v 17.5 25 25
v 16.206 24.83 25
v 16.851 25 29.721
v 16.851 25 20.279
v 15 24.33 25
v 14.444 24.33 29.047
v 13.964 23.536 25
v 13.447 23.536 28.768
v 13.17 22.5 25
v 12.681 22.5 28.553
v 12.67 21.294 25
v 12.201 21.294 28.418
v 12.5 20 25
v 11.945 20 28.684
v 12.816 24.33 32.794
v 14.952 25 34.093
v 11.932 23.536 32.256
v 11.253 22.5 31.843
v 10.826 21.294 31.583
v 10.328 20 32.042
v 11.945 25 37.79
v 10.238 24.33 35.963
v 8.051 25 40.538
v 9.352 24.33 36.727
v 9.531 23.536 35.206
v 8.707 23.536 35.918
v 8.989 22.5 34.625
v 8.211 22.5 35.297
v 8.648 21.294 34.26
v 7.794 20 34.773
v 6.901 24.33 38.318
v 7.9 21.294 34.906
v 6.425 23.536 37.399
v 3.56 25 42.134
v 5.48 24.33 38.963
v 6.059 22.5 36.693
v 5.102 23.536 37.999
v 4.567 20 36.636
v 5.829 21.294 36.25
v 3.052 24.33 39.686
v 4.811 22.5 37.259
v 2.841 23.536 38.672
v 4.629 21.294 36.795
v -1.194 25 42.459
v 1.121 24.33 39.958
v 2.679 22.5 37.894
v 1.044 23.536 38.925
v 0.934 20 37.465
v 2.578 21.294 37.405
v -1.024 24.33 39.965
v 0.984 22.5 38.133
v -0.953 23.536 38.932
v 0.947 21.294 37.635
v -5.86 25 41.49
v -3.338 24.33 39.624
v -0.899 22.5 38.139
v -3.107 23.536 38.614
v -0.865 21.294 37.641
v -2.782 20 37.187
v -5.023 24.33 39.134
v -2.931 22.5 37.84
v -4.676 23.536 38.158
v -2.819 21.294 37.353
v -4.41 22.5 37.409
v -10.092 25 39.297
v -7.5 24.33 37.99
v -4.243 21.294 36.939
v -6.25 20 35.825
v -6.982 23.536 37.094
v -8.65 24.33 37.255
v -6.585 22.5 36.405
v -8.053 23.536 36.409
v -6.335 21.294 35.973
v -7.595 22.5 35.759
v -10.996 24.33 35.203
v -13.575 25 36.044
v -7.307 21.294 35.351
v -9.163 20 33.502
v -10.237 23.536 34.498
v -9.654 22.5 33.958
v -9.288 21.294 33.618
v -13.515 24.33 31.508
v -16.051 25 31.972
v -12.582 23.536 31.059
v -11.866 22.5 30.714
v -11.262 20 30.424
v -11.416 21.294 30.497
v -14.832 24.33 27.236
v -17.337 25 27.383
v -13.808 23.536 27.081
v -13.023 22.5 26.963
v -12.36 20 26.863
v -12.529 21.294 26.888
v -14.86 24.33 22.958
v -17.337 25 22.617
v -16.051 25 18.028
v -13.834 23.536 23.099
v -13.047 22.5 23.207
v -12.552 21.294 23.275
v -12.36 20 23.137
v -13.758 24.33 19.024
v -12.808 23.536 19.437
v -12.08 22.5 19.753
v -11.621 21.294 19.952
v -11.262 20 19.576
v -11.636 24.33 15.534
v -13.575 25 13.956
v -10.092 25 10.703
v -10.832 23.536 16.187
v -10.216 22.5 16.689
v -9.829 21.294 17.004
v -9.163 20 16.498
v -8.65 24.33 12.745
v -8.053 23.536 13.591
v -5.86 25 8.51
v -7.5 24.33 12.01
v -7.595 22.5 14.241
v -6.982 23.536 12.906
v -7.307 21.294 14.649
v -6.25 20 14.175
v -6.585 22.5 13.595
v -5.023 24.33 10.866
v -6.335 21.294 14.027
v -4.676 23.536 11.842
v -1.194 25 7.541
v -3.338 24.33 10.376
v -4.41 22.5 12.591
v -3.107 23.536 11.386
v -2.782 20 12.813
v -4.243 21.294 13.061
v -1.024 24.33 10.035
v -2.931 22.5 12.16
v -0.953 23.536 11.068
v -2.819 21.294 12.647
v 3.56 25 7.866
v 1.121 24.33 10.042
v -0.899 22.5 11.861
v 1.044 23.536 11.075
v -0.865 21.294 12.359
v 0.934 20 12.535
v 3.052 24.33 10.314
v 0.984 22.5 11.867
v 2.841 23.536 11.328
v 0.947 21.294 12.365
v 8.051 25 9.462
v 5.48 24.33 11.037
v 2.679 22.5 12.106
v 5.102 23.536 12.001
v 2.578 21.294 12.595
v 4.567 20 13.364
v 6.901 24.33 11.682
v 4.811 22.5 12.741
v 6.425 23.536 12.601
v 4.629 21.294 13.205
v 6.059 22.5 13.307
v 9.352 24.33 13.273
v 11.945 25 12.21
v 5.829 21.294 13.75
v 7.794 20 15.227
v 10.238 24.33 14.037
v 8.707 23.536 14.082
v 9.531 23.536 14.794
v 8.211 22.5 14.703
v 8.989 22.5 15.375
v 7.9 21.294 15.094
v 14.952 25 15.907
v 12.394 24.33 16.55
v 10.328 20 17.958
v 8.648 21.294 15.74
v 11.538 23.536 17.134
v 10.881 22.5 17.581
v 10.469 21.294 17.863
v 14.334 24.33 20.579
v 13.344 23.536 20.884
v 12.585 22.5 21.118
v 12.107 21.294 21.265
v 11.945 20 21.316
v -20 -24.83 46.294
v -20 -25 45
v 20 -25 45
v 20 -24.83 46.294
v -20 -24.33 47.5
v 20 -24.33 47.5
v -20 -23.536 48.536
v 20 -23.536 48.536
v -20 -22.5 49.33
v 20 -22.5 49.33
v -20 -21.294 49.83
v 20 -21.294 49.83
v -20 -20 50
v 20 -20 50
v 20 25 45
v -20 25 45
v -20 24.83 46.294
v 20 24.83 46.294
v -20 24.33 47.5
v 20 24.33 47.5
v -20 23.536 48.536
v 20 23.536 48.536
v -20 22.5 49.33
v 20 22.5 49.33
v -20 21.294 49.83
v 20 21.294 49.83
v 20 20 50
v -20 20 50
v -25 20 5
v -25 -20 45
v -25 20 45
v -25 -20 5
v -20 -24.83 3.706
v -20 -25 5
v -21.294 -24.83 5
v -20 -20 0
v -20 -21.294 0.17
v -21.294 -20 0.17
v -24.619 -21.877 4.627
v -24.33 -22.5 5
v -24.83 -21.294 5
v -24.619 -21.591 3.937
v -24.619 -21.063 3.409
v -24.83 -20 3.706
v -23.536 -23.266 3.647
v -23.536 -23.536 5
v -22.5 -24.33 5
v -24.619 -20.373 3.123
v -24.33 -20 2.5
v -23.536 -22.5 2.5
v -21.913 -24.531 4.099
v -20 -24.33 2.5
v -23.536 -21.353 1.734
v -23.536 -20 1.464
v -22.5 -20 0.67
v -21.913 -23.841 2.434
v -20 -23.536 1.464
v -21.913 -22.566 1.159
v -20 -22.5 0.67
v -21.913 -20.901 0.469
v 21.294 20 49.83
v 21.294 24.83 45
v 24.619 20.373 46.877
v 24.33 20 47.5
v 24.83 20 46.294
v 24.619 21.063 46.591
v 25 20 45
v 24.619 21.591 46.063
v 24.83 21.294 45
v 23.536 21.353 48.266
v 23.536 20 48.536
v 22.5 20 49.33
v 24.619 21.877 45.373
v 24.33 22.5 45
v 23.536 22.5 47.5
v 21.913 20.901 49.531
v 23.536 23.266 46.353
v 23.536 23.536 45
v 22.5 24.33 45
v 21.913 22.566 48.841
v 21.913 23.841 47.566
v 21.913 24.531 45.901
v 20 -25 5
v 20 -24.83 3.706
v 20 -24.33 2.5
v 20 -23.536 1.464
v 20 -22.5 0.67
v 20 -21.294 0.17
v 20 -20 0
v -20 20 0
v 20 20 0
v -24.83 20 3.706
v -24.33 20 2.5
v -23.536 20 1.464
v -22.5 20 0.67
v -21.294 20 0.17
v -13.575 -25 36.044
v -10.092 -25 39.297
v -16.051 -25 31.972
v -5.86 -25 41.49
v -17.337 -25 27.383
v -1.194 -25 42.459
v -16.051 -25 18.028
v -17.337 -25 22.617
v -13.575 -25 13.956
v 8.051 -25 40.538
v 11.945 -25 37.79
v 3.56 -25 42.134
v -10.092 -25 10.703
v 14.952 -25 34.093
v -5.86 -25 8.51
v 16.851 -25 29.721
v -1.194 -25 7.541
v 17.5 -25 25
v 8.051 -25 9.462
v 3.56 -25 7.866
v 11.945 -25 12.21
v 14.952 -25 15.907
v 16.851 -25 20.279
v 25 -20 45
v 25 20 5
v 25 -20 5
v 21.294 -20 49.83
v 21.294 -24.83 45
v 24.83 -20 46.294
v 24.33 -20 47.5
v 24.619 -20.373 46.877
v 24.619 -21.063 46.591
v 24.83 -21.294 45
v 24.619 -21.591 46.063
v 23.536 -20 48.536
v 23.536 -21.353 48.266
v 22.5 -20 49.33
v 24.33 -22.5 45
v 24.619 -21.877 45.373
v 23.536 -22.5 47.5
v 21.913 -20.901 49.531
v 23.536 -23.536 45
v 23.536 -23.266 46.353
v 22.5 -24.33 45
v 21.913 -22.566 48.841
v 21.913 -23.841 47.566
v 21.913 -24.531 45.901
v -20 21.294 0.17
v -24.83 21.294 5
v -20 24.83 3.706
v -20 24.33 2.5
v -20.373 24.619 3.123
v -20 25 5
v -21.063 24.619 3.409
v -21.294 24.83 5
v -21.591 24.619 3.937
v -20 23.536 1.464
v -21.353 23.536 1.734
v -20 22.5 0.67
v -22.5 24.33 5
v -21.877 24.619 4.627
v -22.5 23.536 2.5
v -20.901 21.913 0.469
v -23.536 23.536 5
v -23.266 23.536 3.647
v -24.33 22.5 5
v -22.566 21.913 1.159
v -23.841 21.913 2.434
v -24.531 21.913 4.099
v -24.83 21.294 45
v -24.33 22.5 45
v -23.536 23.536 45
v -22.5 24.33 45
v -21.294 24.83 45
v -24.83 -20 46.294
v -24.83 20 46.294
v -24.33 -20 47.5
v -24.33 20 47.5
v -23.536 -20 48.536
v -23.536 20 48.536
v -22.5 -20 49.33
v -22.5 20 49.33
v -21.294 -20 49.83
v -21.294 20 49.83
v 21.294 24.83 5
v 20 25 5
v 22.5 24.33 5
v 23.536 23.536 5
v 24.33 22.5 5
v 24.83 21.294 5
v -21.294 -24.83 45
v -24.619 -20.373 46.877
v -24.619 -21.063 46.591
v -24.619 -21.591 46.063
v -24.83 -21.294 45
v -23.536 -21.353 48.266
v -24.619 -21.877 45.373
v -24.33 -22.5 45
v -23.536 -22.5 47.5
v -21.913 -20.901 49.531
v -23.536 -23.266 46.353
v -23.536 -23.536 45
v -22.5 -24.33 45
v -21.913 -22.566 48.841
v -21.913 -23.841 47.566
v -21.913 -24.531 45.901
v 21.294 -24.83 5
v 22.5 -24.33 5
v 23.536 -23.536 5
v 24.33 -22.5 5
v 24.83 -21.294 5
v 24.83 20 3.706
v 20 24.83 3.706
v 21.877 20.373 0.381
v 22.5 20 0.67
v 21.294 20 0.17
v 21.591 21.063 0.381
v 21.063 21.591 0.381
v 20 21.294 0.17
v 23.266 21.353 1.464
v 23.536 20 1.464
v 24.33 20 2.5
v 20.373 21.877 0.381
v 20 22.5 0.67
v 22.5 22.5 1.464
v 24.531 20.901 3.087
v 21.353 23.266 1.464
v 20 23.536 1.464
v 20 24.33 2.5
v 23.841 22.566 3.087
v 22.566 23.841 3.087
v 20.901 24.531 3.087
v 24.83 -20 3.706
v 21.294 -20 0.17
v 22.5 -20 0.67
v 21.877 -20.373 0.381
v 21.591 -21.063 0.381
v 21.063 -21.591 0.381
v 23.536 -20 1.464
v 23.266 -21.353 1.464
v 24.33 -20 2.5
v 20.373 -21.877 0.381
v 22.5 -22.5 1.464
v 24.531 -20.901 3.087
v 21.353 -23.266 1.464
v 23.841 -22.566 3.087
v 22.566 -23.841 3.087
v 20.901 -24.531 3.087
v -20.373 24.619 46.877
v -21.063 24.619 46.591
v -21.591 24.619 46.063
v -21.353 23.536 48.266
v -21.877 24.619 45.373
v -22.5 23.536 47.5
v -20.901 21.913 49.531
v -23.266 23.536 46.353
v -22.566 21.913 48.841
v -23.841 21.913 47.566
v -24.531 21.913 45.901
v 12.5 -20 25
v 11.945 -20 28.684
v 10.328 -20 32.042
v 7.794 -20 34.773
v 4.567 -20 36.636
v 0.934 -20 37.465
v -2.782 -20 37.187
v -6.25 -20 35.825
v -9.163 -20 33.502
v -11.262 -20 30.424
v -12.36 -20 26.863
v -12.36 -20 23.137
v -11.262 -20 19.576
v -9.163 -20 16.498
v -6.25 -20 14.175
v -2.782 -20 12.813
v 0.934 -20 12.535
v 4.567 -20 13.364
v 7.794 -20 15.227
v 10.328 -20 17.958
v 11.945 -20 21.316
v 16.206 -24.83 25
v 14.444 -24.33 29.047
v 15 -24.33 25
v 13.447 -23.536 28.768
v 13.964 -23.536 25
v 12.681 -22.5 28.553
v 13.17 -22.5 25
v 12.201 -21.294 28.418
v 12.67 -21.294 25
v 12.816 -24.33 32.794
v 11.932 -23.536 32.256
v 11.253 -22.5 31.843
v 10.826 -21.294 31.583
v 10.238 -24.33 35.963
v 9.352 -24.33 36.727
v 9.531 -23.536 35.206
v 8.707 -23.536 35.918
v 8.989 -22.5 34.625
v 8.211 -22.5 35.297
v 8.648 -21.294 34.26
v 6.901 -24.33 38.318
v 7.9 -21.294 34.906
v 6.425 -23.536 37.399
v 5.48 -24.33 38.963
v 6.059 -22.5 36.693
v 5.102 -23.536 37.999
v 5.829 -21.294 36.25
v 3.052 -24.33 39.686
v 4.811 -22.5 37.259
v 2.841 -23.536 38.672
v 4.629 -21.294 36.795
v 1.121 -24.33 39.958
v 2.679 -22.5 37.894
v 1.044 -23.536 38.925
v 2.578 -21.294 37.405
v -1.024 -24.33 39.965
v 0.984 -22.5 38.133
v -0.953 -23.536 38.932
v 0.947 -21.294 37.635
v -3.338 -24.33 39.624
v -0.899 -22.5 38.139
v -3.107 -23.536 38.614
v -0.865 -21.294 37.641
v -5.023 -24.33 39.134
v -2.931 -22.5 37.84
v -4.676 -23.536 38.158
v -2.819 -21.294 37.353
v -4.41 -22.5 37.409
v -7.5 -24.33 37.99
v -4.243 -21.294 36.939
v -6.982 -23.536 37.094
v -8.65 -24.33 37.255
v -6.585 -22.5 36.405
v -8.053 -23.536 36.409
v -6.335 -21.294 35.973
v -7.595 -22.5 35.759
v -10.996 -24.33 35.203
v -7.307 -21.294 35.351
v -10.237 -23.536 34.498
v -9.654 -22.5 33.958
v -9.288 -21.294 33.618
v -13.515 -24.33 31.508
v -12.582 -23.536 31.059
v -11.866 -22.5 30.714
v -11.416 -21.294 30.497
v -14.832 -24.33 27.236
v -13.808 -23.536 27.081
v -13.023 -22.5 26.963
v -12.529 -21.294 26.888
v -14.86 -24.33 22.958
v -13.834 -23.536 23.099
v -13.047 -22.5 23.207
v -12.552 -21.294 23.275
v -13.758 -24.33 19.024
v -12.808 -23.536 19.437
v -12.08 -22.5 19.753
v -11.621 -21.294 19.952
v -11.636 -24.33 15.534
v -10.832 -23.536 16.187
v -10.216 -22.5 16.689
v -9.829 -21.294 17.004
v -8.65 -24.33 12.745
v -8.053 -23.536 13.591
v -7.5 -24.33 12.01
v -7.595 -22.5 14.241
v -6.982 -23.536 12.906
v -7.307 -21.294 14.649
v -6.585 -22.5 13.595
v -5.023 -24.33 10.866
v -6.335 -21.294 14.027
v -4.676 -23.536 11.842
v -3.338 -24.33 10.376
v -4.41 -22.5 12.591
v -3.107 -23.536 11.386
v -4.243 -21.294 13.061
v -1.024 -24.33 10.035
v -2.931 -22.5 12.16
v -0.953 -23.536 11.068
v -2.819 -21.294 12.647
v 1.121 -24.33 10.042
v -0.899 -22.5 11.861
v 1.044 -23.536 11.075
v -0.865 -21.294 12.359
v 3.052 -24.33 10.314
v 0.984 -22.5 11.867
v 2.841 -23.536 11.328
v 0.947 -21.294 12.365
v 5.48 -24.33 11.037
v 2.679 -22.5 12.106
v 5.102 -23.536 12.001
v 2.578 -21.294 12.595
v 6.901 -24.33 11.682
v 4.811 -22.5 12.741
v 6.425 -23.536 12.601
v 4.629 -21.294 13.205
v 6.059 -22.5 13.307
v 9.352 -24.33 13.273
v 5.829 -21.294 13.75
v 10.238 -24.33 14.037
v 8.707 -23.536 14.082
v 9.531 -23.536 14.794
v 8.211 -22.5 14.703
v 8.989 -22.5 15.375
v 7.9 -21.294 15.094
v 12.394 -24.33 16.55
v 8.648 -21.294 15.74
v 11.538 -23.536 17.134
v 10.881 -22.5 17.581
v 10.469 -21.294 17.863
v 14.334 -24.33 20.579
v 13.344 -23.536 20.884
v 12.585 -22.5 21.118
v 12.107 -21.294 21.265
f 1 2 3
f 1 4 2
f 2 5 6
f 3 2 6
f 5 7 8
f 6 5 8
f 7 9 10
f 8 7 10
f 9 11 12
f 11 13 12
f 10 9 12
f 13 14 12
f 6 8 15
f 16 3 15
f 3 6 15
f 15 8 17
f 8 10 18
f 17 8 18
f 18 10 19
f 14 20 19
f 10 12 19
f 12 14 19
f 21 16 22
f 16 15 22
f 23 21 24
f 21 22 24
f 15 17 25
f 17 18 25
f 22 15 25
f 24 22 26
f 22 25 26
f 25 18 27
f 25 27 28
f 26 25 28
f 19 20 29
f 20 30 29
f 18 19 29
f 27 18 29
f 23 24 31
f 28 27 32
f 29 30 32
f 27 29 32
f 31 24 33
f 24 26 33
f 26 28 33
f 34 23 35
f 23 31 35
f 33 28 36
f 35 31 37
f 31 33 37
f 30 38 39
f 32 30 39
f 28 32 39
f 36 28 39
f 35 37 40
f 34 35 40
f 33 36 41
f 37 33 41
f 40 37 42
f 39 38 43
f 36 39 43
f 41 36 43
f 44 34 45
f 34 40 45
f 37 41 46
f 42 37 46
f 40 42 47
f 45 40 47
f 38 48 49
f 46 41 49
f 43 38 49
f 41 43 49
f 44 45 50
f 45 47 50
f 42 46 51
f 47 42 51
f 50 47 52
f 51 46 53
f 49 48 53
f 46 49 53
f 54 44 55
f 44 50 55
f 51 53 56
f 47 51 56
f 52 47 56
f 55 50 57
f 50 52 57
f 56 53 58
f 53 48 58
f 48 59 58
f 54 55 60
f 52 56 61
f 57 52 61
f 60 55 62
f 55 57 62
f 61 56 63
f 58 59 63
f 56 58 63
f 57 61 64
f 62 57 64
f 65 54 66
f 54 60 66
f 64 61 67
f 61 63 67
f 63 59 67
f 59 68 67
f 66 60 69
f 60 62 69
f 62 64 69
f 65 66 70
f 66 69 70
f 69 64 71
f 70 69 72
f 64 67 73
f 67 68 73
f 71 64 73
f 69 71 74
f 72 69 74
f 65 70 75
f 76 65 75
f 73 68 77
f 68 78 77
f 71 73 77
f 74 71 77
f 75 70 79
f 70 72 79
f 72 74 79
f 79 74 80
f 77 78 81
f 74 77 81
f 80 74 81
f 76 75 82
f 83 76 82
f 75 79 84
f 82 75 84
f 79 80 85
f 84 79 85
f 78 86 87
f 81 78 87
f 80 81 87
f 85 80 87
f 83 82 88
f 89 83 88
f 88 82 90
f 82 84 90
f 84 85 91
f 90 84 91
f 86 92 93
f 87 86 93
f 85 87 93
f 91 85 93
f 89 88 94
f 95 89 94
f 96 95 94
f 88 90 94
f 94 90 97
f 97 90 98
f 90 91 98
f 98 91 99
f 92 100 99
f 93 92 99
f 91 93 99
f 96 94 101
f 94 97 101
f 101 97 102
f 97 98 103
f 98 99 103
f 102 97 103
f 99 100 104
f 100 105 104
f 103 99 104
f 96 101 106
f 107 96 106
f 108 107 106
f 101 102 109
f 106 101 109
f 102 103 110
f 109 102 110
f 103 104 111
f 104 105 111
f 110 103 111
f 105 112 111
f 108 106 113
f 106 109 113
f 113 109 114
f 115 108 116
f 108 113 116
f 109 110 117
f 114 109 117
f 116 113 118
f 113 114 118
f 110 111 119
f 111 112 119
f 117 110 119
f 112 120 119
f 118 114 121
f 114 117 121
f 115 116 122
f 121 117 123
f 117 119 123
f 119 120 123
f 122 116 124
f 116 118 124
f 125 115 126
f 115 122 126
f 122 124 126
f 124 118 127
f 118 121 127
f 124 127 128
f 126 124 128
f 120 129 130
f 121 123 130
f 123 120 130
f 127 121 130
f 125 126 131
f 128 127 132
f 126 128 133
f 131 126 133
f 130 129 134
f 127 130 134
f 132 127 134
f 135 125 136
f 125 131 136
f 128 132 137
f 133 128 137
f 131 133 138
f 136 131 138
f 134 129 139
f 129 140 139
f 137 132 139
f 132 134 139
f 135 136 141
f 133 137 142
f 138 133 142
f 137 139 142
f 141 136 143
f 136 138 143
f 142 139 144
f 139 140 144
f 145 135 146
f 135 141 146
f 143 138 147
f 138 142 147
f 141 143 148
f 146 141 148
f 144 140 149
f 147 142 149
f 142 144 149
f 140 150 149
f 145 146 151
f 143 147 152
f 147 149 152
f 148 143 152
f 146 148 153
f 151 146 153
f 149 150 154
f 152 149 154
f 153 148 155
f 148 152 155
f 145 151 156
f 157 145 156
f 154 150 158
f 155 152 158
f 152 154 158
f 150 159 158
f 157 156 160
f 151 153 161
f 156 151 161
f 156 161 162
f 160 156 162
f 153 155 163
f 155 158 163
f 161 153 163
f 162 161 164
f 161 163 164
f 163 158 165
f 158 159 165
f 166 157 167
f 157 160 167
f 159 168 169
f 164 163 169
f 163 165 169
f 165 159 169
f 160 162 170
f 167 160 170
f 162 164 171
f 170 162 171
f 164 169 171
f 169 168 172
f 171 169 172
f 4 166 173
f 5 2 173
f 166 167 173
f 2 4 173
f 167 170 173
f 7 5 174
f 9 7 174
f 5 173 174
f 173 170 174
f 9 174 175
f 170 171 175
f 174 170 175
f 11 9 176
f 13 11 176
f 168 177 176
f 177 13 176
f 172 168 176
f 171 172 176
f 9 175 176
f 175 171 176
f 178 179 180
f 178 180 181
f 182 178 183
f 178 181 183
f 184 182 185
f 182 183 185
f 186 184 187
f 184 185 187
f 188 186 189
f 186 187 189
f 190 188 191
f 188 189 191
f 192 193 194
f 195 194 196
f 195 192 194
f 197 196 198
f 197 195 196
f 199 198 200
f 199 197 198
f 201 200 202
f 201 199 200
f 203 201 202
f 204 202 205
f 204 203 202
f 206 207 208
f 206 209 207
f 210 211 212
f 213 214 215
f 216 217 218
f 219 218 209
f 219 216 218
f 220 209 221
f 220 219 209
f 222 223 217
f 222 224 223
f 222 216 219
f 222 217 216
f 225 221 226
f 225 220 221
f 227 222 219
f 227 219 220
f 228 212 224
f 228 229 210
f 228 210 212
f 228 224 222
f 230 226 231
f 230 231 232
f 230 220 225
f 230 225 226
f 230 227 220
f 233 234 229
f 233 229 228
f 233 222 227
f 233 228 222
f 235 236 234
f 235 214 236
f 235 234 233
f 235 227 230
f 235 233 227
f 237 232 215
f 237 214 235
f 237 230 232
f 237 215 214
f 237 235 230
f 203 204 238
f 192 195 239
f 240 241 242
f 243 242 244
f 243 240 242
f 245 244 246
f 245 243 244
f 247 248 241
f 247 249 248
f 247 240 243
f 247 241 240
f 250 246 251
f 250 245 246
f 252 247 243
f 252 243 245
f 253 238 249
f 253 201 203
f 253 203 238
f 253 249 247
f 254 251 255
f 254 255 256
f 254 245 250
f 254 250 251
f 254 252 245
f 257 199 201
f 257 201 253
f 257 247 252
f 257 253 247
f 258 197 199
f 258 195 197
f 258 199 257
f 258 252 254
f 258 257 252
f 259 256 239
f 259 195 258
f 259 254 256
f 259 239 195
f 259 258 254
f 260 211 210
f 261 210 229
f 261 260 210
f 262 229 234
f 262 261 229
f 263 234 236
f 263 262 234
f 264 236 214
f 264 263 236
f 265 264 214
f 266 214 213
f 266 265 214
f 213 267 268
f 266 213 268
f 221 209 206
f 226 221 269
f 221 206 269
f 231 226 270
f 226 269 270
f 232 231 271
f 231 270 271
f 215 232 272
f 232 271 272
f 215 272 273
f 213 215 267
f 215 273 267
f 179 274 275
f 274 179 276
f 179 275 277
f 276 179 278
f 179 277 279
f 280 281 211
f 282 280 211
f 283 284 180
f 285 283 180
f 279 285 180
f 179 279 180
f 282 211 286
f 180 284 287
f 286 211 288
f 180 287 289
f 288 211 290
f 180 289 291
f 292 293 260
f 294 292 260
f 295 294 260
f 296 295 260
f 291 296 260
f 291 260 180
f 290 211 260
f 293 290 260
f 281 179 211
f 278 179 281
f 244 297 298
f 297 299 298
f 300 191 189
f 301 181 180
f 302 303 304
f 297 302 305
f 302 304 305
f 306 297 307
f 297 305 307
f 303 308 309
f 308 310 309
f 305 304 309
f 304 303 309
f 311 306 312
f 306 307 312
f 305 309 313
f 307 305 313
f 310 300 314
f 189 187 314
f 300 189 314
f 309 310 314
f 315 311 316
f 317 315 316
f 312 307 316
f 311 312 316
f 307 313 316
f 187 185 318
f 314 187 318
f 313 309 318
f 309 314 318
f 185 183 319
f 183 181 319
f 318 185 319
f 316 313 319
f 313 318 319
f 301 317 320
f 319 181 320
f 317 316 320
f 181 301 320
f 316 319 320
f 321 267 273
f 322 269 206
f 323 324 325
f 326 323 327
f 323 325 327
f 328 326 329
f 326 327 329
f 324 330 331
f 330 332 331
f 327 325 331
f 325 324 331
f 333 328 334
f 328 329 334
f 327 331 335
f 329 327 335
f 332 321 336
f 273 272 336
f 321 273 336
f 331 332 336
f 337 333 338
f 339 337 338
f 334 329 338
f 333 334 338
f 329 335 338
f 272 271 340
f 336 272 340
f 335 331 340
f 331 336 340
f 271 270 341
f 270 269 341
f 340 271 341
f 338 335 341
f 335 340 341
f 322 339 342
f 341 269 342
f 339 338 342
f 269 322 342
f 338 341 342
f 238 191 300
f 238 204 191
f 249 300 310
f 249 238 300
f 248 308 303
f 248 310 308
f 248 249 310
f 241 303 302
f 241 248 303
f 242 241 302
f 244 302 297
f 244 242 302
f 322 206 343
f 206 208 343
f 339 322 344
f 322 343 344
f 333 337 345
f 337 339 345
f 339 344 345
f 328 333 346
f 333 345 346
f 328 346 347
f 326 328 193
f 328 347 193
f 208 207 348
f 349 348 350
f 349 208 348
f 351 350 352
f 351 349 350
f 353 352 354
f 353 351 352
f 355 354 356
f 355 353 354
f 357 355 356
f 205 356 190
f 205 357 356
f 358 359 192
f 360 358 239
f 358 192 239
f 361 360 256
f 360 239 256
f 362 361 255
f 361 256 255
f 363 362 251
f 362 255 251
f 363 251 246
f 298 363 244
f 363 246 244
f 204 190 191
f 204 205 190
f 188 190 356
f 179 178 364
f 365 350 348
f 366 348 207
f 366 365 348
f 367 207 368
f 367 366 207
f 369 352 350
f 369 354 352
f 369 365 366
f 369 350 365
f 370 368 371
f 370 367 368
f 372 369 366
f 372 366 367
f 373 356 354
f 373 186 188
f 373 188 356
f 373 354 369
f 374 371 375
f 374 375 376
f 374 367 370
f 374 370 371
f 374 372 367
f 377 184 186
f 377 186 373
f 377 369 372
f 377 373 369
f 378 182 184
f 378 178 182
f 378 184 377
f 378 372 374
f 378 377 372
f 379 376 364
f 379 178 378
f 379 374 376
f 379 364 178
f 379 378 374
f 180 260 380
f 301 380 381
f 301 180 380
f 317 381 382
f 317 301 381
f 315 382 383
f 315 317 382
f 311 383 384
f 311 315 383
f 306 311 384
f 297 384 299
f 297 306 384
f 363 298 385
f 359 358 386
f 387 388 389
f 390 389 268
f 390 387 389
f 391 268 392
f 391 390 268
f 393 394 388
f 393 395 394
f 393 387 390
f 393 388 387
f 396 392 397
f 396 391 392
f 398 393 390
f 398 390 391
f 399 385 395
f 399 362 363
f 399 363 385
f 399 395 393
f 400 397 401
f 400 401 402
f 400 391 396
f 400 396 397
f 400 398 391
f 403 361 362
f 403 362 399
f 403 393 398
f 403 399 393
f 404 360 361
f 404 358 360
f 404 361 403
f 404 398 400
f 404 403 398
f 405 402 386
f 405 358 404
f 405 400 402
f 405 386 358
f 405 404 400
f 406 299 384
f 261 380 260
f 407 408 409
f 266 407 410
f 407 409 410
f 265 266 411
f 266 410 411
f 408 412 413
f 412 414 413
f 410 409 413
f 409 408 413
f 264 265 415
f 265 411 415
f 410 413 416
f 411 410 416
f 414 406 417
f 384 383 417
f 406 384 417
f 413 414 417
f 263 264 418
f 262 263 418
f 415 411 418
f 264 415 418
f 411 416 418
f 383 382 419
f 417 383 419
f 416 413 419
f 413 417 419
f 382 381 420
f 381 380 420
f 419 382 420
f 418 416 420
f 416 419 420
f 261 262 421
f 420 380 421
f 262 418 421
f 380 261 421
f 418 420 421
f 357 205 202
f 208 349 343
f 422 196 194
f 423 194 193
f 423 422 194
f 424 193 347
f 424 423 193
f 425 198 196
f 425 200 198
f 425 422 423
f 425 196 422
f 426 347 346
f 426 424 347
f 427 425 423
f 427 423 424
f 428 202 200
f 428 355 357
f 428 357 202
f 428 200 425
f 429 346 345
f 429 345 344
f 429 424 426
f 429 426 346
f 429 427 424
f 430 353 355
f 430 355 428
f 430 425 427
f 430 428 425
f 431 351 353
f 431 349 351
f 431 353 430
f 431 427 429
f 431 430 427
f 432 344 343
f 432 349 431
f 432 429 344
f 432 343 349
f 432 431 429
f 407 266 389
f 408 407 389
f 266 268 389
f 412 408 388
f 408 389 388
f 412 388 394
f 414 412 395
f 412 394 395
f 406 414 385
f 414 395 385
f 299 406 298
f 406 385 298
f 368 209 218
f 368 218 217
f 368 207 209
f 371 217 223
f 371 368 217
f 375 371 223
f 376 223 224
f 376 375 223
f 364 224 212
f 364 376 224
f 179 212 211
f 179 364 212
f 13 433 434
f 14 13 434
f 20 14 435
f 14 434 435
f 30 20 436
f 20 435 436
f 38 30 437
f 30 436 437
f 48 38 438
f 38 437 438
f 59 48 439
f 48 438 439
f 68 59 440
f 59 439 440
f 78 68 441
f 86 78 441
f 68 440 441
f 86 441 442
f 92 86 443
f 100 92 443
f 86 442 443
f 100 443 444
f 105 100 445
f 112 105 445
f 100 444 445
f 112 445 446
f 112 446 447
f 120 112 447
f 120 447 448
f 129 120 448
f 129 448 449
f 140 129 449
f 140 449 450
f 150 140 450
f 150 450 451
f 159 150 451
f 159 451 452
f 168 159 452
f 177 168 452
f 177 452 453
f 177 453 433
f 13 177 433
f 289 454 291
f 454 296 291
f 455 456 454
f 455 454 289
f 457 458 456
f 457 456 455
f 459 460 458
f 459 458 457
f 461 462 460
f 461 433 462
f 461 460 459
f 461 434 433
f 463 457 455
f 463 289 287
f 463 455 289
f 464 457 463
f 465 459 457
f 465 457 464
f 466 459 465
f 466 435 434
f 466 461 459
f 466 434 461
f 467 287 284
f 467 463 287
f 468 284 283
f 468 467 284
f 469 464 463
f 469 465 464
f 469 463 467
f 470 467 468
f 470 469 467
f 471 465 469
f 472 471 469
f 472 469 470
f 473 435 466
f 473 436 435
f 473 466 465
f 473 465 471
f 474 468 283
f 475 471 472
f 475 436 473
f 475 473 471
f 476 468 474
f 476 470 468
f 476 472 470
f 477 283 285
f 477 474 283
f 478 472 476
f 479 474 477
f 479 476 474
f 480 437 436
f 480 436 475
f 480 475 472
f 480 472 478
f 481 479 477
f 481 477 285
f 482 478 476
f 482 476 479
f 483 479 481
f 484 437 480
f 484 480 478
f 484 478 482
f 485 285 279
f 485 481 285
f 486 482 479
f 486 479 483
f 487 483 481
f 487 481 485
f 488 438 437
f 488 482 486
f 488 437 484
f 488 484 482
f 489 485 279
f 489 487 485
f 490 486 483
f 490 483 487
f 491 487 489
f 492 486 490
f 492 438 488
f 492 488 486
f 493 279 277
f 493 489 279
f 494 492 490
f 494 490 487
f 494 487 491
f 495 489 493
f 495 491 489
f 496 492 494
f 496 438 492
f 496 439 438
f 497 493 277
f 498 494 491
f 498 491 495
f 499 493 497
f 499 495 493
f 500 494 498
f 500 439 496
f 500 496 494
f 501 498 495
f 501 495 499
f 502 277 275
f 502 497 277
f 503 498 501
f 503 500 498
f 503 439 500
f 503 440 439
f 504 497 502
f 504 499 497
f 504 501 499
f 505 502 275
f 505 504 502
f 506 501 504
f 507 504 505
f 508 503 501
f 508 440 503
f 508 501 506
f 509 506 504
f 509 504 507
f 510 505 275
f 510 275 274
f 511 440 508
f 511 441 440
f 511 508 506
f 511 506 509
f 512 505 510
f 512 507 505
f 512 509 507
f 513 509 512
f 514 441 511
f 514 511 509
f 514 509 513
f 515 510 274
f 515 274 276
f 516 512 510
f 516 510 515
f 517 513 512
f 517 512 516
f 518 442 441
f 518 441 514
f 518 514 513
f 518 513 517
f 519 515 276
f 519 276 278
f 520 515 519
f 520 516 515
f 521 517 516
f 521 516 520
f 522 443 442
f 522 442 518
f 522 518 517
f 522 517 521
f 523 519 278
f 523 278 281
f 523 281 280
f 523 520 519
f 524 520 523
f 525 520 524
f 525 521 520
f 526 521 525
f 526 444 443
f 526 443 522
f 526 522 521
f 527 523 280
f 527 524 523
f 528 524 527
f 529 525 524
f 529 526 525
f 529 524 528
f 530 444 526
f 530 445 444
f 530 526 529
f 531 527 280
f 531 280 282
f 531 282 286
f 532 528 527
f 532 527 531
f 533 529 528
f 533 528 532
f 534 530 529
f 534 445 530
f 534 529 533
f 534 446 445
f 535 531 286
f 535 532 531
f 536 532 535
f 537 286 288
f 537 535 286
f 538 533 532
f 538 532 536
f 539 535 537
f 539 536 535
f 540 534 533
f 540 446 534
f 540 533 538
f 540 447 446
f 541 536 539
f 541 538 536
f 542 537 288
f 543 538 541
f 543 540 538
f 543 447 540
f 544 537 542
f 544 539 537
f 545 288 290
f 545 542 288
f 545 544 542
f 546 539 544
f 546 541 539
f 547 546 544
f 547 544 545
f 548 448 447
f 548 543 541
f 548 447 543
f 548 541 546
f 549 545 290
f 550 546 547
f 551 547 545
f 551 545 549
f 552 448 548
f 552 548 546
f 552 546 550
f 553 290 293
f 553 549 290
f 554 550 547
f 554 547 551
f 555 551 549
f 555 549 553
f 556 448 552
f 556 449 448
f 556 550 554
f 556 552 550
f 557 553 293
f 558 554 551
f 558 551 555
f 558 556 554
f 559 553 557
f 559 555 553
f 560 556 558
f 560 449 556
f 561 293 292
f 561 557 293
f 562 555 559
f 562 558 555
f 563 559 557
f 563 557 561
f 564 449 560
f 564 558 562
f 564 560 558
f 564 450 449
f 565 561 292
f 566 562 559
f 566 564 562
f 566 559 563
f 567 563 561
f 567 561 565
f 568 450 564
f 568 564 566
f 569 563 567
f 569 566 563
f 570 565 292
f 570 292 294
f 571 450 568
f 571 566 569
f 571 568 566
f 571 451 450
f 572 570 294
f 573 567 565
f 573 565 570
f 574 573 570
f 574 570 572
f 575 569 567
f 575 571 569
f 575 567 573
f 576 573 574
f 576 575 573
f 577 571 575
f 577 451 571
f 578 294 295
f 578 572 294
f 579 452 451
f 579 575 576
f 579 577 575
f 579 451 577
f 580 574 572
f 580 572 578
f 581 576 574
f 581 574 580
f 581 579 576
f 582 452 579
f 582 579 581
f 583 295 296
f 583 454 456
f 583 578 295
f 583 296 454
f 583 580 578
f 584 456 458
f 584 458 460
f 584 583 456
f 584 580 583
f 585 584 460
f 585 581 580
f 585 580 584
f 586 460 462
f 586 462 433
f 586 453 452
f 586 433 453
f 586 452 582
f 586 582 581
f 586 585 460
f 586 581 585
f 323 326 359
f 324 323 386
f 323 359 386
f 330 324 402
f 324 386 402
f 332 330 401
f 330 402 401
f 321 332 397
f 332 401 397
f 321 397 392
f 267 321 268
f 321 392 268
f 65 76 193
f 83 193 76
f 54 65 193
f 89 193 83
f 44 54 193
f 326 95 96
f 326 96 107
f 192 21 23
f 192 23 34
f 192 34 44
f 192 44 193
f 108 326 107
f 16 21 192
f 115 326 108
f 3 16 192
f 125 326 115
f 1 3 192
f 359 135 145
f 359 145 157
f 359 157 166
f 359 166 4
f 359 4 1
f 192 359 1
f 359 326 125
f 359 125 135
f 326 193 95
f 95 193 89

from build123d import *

# Parameters (mm, degrees)
F0_W     = 50
F0_H     = 50
F1_DEPTH = 50
F2_R     = 12.5
F3_DEPTH = 50.001
F4_R     = 5
F5_R     = 5


with BuildPart() as f1:
    # F0 (on Top) → F1 (new body)
    with BuildSketch(Plane.XY):
        Rectangle(F0_W, F0_H)
    extrude(amount=F1_DEPTH)

    # F2 (on face) → F3 (cut, through all)
    with BuildSketch(Plane.XZ.offset(25)):
        with Locations((0, 25)):
            Circle(F2_R)
    extrude(amount=-F3_DEPTH, mode=Mode.SUBTRACT)

    # F4
    f4_edges = [f1.edges().sort_by_distance(p)[0] for p in [
        (0, -25, 50),
        (-25, 0, 50),
        (0, 25, 50),
        (25, 0, 50),
        (25, 25, 25),
        (25, -25, 25),
        (25, 0, 0),
        (0, -25, 0),
        (-25, -25, 25),
        (-25, 0, 0),
        (0, 25, 0),
        (-25, 25, 25),
    ]]
    fillet(f4_edges, radius=F4_R)

    # F5
    f5_edges = [f1.edges().sort_by_distance(p)[0] for p in [
        (-12.5, -25, 25),
        (25, 0, 5),
        (20, 0, 0),
        (0, 20, 0),
        (-12.5, 25, 25),
    ]]
    fillet(f5_edges, radius=F5_R)


solid = f1.part
